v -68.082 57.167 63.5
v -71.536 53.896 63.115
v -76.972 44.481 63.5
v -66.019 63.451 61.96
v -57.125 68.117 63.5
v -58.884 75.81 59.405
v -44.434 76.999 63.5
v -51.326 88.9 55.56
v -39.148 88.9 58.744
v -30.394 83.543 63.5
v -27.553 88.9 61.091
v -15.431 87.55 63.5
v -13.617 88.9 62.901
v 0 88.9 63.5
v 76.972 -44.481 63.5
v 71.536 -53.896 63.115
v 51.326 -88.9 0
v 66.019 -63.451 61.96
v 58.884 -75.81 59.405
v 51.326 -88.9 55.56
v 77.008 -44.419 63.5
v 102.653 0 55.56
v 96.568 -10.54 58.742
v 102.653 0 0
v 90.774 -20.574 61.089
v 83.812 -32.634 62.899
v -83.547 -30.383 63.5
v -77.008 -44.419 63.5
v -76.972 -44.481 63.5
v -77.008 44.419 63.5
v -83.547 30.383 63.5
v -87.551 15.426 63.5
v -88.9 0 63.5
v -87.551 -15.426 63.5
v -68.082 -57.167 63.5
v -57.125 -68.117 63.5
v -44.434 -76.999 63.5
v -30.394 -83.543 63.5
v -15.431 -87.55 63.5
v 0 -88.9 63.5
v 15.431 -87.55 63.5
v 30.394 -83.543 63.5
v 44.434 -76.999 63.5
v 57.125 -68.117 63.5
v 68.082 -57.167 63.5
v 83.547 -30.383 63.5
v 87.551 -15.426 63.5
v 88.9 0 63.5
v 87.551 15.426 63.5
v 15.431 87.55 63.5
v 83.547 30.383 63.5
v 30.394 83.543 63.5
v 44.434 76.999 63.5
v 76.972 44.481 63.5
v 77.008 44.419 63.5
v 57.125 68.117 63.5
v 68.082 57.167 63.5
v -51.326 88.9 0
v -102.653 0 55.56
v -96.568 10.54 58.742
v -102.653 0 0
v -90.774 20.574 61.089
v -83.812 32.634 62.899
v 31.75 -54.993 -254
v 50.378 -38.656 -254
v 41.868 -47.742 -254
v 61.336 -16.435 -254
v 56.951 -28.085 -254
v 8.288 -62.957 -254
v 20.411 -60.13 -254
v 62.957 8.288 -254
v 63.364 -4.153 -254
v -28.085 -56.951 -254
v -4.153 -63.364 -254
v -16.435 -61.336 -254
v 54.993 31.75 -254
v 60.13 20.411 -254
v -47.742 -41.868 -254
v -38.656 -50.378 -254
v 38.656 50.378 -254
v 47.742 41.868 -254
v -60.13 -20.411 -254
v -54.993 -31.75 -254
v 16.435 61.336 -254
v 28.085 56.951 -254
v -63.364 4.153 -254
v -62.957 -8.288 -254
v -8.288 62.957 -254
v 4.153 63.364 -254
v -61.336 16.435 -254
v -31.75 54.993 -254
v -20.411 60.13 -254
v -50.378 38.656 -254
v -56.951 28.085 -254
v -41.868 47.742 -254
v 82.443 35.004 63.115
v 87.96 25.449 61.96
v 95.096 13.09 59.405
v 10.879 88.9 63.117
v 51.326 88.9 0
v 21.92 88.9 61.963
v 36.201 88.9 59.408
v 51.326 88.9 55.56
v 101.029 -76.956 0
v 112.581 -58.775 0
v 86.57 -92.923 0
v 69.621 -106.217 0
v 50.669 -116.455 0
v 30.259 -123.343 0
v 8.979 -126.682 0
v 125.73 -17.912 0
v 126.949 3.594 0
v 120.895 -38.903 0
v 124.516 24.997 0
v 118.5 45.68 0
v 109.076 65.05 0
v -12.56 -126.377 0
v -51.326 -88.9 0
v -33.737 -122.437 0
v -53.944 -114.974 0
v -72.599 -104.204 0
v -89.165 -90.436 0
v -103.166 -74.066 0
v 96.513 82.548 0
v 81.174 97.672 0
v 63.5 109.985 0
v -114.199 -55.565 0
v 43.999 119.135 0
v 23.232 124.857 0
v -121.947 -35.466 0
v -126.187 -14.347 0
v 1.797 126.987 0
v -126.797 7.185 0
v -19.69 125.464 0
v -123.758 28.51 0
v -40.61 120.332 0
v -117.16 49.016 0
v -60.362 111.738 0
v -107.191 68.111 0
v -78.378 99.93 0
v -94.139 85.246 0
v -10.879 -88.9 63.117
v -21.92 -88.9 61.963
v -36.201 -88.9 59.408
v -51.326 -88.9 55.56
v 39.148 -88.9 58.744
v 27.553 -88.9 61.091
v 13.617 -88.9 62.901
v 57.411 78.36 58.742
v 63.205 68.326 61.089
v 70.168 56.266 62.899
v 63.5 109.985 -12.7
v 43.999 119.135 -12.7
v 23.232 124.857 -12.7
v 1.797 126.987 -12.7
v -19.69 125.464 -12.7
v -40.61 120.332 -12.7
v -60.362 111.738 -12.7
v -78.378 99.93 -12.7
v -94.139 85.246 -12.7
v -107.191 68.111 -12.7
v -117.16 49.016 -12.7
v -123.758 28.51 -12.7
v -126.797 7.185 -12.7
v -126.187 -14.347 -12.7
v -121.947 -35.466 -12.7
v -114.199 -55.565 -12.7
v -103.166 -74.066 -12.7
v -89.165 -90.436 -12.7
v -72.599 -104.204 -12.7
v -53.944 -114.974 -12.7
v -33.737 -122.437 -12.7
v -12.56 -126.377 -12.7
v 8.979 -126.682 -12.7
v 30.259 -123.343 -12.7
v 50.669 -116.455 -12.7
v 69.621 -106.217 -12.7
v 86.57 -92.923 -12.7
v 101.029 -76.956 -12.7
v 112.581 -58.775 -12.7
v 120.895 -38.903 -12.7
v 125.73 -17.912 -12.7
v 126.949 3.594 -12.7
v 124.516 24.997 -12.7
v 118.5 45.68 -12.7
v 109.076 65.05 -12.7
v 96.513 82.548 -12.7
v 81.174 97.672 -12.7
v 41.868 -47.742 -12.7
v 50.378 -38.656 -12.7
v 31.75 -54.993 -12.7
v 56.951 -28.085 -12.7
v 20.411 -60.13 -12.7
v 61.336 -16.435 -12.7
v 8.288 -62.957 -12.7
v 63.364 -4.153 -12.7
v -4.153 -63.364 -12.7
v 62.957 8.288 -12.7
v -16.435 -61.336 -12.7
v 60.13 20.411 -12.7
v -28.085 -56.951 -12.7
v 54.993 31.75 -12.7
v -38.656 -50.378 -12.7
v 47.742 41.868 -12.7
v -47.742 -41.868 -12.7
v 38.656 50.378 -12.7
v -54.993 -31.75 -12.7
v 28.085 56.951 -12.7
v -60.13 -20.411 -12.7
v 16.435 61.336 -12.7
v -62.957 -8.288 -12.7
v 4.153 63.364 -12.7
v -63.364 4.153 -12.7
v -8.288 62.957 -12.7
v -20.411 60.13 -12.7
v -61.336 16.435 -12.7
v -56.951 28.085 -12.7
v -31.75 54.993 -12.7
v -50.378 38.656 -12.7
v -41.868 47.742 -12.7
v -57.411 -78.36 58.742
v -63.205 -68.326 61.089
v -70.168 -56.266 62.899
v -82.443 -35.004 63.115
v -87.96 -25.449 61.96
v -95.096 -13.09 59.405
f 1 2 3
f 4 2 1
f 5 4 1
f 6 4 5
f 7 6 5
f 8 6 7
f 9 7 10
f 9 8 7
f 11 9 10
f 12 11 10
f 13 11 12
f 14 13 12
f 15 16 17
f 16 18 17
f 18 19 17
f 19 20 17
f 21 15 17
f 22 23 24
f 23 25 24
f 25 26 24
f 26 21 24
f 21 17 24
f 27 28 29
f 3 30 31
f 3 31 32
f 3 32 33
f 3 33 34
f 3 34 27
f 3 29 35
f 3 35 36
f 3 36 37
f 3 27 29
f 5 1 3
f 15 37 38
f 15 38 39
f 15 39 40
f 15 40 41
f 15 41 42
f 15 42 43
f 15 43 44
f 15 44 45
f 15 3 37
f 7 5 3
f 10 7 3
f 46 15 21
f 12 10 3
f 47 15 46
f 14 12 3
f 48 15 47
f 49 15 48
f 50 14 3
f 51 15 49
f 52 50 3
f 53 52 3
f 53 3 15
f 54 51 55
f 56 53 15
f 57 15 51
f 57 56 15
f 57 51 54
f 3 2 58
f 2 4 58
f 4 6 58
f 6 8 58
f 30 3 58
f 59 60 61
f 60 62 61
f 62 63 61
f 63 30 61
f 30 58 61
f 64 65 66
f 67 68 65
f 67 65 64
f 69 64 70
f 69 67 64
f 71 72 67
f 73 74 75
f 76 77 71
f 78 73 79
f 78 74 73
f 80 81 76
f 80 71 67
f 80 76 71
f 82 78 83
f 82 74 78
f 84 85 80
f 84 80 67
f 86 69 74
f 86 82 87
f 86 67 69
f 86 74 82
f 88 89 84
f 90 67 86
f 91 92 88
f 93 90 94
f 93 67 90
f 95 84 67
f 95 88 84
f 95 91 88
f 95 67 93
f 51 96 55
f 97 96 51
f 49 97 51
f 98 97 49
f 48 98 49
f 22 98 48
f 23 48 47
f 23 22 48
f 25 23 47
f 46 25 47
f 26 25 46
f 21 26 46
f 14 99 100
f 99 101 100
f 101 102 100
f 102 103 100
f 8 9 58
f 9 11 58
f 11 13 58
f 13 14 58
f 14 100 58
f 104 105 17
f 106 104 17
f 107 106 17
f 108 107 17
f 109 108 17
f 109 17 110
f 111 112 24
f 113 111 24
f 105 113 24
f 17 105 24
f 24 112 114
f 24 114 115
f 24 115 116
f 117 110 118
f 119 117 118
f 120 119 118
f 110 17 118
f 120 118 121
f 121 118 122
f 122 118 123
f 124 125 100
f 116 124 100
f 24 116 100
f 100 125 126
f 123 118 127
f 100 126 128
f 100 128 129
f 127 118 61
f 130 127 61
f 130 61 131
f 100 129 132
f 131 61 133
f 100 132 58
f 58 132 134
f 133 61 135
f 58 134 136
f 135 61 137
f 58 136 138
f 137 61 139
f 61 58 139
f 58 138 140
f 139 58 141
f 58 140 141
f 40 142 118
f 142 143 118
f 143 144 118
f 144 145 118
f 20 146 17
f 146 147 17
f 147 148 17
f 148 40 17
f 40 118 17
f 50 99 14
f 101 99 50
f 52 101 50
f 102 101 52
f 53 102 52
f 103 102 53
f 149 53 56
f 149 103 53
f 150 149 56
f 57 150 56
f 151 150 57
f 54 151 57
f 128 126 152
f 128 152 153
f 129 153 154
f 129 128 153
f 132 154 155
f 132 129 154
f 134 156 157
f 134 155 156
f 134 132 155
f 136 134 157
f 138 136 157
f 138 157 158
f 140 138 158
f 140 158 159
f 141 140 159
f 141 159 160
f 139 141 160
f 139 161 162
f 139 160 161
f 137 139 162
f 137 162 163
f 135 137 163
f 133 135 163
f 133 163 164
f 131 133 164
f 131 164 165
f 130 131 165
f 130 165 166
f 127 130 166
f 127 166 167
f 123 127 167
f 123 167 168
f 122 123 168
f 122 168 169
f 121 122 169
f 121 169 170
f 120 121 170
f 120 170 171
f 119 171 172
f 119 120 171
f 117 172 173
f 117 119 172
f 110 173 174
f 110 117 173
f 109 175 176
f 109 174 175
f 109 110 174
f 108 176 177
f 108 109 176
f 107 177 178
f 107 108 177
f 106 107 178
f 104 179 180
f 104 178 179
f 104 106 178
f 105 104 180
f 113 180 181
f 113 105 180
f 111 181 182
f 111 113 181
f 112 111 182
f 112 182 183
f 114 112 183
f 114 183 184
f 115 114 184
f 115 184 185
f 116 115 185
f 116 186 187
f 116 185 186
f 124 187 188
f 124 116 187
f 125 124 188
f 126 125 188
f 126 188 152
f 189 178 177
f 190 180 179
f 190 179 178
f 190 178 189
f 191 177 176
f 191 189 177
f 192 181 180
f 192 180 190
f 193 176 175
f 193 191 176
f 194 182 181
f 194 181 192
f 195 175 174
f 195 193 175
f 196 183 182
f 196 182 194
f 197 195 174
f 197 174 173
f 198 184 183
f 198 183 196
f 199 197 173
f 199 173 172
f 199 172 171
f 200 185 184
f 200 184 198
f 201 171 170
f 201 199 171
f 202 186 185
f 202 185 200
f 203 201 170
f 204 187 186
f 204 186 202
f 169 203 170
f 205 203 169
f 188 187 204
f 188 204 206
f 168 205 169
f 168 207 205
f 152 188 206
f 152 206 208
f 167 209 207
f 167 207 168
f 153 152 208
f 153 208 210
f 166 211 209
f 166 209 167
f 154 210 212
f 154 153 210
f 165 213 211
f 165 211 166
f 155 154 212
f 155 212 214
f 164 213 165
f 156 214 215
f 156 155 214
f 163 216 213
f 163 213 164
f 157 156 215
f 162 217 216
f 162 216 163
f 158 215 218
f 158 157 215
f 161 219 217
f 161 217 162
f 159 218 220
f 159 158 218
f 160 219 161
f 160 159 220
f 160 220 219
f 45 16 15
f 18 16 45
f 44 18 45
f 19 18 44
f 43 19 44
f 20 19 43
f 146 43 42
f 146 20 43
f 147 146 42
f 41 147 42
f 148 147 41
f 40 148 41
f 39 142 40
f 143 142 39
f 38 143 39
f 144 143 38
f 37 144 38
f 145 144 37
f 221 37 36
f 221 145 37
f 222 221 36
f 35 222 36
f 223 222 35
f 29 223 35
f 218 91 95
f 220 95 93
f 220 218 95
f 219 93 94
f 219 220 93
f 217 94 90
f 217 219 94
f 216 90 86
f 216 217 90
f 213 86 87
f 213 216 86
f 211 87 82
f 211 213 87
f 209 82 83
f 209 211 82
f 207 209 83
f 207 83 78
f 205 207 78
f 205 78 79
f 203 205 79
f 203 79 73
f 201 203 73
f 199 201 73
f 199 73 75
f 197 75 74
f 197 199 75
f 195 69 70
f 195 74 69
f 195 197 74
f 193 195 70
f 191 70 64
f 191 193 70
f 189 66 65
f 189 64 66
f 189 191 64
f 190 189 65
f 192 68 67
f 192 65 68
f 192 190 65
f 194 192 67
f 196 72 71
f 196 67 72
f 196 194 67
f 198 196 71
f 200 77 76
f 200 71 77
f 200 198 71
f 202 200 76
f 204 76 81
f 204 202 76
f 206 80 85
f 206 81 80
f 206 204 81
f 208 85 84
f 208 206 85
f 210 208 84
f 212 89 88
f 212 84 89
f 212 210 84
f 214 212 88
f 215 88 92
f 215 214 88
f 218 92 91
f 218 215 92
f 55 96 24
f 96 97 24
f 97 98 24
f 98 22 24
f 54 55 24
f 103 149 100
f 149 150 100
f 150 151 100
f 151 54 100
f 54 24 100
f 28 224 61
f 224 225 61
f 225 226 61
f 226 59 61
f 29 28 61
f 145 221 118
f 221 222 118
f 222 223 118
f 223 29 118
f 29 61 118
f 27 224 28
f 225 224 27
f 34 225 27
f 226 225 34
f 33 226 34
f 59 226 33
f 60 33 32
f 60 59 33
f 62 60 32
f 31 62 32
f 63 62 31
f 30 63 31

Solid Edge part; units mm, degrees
sketch "Sketch1" plane through (0, 0, 0) normal (0, 0, 1) x (1, 0, 0)
  line L0 (-102.6529, 0) -> (-51.3264, -88.9)
  line L1 (-51.3264, -88.9) -> (51.3264, -88.9)
  line L2 (51.3264, -88.9) -> (102.6529, 0)
  line L3 (102.6529, 0) -> (51.3264, 88.9)
  line L4 (51.3264, 88.9) -> (-51.3264, 88.9)
  line L5 (-51.3264, 88.9) -> (-102.6529, 0)
extrude "Protrusion1" add sketch "Sketch1" along normal blind 63.5
sketch "Sketch2" plane through (0, 0, 0) normal (0, 0, -1) x (-0.5, 0.866, 0)
  circle A0 centre (0, 0) radius 63.5
extrude "ExtrudedProtrusion_2" add sketch "Sketch2" along normal blind 254
sketch "Sketch3" plane through (0, 0, 0) normal (0, 0, -1) x (0.5, 0.866, 0)
  circle A0 centre (0, 0) radius 127
extrude "ExtrudedProtrusion_3" add sketch "Sketch3" along normal blind 12.7
sketch "Sketch4" plane through (0, 0, 0) normal (0, -1, 0) x (1, 0, 0)
  line L0 (88.9, 63.5) -> (126.295, 41.91)
revolve "RevolvedCutout1" cut sketch "Sketch4" angle 360 about axis through (0, 0, 0) along (0, 0, 1) material side at (107.6225, 0, 52.7483)
